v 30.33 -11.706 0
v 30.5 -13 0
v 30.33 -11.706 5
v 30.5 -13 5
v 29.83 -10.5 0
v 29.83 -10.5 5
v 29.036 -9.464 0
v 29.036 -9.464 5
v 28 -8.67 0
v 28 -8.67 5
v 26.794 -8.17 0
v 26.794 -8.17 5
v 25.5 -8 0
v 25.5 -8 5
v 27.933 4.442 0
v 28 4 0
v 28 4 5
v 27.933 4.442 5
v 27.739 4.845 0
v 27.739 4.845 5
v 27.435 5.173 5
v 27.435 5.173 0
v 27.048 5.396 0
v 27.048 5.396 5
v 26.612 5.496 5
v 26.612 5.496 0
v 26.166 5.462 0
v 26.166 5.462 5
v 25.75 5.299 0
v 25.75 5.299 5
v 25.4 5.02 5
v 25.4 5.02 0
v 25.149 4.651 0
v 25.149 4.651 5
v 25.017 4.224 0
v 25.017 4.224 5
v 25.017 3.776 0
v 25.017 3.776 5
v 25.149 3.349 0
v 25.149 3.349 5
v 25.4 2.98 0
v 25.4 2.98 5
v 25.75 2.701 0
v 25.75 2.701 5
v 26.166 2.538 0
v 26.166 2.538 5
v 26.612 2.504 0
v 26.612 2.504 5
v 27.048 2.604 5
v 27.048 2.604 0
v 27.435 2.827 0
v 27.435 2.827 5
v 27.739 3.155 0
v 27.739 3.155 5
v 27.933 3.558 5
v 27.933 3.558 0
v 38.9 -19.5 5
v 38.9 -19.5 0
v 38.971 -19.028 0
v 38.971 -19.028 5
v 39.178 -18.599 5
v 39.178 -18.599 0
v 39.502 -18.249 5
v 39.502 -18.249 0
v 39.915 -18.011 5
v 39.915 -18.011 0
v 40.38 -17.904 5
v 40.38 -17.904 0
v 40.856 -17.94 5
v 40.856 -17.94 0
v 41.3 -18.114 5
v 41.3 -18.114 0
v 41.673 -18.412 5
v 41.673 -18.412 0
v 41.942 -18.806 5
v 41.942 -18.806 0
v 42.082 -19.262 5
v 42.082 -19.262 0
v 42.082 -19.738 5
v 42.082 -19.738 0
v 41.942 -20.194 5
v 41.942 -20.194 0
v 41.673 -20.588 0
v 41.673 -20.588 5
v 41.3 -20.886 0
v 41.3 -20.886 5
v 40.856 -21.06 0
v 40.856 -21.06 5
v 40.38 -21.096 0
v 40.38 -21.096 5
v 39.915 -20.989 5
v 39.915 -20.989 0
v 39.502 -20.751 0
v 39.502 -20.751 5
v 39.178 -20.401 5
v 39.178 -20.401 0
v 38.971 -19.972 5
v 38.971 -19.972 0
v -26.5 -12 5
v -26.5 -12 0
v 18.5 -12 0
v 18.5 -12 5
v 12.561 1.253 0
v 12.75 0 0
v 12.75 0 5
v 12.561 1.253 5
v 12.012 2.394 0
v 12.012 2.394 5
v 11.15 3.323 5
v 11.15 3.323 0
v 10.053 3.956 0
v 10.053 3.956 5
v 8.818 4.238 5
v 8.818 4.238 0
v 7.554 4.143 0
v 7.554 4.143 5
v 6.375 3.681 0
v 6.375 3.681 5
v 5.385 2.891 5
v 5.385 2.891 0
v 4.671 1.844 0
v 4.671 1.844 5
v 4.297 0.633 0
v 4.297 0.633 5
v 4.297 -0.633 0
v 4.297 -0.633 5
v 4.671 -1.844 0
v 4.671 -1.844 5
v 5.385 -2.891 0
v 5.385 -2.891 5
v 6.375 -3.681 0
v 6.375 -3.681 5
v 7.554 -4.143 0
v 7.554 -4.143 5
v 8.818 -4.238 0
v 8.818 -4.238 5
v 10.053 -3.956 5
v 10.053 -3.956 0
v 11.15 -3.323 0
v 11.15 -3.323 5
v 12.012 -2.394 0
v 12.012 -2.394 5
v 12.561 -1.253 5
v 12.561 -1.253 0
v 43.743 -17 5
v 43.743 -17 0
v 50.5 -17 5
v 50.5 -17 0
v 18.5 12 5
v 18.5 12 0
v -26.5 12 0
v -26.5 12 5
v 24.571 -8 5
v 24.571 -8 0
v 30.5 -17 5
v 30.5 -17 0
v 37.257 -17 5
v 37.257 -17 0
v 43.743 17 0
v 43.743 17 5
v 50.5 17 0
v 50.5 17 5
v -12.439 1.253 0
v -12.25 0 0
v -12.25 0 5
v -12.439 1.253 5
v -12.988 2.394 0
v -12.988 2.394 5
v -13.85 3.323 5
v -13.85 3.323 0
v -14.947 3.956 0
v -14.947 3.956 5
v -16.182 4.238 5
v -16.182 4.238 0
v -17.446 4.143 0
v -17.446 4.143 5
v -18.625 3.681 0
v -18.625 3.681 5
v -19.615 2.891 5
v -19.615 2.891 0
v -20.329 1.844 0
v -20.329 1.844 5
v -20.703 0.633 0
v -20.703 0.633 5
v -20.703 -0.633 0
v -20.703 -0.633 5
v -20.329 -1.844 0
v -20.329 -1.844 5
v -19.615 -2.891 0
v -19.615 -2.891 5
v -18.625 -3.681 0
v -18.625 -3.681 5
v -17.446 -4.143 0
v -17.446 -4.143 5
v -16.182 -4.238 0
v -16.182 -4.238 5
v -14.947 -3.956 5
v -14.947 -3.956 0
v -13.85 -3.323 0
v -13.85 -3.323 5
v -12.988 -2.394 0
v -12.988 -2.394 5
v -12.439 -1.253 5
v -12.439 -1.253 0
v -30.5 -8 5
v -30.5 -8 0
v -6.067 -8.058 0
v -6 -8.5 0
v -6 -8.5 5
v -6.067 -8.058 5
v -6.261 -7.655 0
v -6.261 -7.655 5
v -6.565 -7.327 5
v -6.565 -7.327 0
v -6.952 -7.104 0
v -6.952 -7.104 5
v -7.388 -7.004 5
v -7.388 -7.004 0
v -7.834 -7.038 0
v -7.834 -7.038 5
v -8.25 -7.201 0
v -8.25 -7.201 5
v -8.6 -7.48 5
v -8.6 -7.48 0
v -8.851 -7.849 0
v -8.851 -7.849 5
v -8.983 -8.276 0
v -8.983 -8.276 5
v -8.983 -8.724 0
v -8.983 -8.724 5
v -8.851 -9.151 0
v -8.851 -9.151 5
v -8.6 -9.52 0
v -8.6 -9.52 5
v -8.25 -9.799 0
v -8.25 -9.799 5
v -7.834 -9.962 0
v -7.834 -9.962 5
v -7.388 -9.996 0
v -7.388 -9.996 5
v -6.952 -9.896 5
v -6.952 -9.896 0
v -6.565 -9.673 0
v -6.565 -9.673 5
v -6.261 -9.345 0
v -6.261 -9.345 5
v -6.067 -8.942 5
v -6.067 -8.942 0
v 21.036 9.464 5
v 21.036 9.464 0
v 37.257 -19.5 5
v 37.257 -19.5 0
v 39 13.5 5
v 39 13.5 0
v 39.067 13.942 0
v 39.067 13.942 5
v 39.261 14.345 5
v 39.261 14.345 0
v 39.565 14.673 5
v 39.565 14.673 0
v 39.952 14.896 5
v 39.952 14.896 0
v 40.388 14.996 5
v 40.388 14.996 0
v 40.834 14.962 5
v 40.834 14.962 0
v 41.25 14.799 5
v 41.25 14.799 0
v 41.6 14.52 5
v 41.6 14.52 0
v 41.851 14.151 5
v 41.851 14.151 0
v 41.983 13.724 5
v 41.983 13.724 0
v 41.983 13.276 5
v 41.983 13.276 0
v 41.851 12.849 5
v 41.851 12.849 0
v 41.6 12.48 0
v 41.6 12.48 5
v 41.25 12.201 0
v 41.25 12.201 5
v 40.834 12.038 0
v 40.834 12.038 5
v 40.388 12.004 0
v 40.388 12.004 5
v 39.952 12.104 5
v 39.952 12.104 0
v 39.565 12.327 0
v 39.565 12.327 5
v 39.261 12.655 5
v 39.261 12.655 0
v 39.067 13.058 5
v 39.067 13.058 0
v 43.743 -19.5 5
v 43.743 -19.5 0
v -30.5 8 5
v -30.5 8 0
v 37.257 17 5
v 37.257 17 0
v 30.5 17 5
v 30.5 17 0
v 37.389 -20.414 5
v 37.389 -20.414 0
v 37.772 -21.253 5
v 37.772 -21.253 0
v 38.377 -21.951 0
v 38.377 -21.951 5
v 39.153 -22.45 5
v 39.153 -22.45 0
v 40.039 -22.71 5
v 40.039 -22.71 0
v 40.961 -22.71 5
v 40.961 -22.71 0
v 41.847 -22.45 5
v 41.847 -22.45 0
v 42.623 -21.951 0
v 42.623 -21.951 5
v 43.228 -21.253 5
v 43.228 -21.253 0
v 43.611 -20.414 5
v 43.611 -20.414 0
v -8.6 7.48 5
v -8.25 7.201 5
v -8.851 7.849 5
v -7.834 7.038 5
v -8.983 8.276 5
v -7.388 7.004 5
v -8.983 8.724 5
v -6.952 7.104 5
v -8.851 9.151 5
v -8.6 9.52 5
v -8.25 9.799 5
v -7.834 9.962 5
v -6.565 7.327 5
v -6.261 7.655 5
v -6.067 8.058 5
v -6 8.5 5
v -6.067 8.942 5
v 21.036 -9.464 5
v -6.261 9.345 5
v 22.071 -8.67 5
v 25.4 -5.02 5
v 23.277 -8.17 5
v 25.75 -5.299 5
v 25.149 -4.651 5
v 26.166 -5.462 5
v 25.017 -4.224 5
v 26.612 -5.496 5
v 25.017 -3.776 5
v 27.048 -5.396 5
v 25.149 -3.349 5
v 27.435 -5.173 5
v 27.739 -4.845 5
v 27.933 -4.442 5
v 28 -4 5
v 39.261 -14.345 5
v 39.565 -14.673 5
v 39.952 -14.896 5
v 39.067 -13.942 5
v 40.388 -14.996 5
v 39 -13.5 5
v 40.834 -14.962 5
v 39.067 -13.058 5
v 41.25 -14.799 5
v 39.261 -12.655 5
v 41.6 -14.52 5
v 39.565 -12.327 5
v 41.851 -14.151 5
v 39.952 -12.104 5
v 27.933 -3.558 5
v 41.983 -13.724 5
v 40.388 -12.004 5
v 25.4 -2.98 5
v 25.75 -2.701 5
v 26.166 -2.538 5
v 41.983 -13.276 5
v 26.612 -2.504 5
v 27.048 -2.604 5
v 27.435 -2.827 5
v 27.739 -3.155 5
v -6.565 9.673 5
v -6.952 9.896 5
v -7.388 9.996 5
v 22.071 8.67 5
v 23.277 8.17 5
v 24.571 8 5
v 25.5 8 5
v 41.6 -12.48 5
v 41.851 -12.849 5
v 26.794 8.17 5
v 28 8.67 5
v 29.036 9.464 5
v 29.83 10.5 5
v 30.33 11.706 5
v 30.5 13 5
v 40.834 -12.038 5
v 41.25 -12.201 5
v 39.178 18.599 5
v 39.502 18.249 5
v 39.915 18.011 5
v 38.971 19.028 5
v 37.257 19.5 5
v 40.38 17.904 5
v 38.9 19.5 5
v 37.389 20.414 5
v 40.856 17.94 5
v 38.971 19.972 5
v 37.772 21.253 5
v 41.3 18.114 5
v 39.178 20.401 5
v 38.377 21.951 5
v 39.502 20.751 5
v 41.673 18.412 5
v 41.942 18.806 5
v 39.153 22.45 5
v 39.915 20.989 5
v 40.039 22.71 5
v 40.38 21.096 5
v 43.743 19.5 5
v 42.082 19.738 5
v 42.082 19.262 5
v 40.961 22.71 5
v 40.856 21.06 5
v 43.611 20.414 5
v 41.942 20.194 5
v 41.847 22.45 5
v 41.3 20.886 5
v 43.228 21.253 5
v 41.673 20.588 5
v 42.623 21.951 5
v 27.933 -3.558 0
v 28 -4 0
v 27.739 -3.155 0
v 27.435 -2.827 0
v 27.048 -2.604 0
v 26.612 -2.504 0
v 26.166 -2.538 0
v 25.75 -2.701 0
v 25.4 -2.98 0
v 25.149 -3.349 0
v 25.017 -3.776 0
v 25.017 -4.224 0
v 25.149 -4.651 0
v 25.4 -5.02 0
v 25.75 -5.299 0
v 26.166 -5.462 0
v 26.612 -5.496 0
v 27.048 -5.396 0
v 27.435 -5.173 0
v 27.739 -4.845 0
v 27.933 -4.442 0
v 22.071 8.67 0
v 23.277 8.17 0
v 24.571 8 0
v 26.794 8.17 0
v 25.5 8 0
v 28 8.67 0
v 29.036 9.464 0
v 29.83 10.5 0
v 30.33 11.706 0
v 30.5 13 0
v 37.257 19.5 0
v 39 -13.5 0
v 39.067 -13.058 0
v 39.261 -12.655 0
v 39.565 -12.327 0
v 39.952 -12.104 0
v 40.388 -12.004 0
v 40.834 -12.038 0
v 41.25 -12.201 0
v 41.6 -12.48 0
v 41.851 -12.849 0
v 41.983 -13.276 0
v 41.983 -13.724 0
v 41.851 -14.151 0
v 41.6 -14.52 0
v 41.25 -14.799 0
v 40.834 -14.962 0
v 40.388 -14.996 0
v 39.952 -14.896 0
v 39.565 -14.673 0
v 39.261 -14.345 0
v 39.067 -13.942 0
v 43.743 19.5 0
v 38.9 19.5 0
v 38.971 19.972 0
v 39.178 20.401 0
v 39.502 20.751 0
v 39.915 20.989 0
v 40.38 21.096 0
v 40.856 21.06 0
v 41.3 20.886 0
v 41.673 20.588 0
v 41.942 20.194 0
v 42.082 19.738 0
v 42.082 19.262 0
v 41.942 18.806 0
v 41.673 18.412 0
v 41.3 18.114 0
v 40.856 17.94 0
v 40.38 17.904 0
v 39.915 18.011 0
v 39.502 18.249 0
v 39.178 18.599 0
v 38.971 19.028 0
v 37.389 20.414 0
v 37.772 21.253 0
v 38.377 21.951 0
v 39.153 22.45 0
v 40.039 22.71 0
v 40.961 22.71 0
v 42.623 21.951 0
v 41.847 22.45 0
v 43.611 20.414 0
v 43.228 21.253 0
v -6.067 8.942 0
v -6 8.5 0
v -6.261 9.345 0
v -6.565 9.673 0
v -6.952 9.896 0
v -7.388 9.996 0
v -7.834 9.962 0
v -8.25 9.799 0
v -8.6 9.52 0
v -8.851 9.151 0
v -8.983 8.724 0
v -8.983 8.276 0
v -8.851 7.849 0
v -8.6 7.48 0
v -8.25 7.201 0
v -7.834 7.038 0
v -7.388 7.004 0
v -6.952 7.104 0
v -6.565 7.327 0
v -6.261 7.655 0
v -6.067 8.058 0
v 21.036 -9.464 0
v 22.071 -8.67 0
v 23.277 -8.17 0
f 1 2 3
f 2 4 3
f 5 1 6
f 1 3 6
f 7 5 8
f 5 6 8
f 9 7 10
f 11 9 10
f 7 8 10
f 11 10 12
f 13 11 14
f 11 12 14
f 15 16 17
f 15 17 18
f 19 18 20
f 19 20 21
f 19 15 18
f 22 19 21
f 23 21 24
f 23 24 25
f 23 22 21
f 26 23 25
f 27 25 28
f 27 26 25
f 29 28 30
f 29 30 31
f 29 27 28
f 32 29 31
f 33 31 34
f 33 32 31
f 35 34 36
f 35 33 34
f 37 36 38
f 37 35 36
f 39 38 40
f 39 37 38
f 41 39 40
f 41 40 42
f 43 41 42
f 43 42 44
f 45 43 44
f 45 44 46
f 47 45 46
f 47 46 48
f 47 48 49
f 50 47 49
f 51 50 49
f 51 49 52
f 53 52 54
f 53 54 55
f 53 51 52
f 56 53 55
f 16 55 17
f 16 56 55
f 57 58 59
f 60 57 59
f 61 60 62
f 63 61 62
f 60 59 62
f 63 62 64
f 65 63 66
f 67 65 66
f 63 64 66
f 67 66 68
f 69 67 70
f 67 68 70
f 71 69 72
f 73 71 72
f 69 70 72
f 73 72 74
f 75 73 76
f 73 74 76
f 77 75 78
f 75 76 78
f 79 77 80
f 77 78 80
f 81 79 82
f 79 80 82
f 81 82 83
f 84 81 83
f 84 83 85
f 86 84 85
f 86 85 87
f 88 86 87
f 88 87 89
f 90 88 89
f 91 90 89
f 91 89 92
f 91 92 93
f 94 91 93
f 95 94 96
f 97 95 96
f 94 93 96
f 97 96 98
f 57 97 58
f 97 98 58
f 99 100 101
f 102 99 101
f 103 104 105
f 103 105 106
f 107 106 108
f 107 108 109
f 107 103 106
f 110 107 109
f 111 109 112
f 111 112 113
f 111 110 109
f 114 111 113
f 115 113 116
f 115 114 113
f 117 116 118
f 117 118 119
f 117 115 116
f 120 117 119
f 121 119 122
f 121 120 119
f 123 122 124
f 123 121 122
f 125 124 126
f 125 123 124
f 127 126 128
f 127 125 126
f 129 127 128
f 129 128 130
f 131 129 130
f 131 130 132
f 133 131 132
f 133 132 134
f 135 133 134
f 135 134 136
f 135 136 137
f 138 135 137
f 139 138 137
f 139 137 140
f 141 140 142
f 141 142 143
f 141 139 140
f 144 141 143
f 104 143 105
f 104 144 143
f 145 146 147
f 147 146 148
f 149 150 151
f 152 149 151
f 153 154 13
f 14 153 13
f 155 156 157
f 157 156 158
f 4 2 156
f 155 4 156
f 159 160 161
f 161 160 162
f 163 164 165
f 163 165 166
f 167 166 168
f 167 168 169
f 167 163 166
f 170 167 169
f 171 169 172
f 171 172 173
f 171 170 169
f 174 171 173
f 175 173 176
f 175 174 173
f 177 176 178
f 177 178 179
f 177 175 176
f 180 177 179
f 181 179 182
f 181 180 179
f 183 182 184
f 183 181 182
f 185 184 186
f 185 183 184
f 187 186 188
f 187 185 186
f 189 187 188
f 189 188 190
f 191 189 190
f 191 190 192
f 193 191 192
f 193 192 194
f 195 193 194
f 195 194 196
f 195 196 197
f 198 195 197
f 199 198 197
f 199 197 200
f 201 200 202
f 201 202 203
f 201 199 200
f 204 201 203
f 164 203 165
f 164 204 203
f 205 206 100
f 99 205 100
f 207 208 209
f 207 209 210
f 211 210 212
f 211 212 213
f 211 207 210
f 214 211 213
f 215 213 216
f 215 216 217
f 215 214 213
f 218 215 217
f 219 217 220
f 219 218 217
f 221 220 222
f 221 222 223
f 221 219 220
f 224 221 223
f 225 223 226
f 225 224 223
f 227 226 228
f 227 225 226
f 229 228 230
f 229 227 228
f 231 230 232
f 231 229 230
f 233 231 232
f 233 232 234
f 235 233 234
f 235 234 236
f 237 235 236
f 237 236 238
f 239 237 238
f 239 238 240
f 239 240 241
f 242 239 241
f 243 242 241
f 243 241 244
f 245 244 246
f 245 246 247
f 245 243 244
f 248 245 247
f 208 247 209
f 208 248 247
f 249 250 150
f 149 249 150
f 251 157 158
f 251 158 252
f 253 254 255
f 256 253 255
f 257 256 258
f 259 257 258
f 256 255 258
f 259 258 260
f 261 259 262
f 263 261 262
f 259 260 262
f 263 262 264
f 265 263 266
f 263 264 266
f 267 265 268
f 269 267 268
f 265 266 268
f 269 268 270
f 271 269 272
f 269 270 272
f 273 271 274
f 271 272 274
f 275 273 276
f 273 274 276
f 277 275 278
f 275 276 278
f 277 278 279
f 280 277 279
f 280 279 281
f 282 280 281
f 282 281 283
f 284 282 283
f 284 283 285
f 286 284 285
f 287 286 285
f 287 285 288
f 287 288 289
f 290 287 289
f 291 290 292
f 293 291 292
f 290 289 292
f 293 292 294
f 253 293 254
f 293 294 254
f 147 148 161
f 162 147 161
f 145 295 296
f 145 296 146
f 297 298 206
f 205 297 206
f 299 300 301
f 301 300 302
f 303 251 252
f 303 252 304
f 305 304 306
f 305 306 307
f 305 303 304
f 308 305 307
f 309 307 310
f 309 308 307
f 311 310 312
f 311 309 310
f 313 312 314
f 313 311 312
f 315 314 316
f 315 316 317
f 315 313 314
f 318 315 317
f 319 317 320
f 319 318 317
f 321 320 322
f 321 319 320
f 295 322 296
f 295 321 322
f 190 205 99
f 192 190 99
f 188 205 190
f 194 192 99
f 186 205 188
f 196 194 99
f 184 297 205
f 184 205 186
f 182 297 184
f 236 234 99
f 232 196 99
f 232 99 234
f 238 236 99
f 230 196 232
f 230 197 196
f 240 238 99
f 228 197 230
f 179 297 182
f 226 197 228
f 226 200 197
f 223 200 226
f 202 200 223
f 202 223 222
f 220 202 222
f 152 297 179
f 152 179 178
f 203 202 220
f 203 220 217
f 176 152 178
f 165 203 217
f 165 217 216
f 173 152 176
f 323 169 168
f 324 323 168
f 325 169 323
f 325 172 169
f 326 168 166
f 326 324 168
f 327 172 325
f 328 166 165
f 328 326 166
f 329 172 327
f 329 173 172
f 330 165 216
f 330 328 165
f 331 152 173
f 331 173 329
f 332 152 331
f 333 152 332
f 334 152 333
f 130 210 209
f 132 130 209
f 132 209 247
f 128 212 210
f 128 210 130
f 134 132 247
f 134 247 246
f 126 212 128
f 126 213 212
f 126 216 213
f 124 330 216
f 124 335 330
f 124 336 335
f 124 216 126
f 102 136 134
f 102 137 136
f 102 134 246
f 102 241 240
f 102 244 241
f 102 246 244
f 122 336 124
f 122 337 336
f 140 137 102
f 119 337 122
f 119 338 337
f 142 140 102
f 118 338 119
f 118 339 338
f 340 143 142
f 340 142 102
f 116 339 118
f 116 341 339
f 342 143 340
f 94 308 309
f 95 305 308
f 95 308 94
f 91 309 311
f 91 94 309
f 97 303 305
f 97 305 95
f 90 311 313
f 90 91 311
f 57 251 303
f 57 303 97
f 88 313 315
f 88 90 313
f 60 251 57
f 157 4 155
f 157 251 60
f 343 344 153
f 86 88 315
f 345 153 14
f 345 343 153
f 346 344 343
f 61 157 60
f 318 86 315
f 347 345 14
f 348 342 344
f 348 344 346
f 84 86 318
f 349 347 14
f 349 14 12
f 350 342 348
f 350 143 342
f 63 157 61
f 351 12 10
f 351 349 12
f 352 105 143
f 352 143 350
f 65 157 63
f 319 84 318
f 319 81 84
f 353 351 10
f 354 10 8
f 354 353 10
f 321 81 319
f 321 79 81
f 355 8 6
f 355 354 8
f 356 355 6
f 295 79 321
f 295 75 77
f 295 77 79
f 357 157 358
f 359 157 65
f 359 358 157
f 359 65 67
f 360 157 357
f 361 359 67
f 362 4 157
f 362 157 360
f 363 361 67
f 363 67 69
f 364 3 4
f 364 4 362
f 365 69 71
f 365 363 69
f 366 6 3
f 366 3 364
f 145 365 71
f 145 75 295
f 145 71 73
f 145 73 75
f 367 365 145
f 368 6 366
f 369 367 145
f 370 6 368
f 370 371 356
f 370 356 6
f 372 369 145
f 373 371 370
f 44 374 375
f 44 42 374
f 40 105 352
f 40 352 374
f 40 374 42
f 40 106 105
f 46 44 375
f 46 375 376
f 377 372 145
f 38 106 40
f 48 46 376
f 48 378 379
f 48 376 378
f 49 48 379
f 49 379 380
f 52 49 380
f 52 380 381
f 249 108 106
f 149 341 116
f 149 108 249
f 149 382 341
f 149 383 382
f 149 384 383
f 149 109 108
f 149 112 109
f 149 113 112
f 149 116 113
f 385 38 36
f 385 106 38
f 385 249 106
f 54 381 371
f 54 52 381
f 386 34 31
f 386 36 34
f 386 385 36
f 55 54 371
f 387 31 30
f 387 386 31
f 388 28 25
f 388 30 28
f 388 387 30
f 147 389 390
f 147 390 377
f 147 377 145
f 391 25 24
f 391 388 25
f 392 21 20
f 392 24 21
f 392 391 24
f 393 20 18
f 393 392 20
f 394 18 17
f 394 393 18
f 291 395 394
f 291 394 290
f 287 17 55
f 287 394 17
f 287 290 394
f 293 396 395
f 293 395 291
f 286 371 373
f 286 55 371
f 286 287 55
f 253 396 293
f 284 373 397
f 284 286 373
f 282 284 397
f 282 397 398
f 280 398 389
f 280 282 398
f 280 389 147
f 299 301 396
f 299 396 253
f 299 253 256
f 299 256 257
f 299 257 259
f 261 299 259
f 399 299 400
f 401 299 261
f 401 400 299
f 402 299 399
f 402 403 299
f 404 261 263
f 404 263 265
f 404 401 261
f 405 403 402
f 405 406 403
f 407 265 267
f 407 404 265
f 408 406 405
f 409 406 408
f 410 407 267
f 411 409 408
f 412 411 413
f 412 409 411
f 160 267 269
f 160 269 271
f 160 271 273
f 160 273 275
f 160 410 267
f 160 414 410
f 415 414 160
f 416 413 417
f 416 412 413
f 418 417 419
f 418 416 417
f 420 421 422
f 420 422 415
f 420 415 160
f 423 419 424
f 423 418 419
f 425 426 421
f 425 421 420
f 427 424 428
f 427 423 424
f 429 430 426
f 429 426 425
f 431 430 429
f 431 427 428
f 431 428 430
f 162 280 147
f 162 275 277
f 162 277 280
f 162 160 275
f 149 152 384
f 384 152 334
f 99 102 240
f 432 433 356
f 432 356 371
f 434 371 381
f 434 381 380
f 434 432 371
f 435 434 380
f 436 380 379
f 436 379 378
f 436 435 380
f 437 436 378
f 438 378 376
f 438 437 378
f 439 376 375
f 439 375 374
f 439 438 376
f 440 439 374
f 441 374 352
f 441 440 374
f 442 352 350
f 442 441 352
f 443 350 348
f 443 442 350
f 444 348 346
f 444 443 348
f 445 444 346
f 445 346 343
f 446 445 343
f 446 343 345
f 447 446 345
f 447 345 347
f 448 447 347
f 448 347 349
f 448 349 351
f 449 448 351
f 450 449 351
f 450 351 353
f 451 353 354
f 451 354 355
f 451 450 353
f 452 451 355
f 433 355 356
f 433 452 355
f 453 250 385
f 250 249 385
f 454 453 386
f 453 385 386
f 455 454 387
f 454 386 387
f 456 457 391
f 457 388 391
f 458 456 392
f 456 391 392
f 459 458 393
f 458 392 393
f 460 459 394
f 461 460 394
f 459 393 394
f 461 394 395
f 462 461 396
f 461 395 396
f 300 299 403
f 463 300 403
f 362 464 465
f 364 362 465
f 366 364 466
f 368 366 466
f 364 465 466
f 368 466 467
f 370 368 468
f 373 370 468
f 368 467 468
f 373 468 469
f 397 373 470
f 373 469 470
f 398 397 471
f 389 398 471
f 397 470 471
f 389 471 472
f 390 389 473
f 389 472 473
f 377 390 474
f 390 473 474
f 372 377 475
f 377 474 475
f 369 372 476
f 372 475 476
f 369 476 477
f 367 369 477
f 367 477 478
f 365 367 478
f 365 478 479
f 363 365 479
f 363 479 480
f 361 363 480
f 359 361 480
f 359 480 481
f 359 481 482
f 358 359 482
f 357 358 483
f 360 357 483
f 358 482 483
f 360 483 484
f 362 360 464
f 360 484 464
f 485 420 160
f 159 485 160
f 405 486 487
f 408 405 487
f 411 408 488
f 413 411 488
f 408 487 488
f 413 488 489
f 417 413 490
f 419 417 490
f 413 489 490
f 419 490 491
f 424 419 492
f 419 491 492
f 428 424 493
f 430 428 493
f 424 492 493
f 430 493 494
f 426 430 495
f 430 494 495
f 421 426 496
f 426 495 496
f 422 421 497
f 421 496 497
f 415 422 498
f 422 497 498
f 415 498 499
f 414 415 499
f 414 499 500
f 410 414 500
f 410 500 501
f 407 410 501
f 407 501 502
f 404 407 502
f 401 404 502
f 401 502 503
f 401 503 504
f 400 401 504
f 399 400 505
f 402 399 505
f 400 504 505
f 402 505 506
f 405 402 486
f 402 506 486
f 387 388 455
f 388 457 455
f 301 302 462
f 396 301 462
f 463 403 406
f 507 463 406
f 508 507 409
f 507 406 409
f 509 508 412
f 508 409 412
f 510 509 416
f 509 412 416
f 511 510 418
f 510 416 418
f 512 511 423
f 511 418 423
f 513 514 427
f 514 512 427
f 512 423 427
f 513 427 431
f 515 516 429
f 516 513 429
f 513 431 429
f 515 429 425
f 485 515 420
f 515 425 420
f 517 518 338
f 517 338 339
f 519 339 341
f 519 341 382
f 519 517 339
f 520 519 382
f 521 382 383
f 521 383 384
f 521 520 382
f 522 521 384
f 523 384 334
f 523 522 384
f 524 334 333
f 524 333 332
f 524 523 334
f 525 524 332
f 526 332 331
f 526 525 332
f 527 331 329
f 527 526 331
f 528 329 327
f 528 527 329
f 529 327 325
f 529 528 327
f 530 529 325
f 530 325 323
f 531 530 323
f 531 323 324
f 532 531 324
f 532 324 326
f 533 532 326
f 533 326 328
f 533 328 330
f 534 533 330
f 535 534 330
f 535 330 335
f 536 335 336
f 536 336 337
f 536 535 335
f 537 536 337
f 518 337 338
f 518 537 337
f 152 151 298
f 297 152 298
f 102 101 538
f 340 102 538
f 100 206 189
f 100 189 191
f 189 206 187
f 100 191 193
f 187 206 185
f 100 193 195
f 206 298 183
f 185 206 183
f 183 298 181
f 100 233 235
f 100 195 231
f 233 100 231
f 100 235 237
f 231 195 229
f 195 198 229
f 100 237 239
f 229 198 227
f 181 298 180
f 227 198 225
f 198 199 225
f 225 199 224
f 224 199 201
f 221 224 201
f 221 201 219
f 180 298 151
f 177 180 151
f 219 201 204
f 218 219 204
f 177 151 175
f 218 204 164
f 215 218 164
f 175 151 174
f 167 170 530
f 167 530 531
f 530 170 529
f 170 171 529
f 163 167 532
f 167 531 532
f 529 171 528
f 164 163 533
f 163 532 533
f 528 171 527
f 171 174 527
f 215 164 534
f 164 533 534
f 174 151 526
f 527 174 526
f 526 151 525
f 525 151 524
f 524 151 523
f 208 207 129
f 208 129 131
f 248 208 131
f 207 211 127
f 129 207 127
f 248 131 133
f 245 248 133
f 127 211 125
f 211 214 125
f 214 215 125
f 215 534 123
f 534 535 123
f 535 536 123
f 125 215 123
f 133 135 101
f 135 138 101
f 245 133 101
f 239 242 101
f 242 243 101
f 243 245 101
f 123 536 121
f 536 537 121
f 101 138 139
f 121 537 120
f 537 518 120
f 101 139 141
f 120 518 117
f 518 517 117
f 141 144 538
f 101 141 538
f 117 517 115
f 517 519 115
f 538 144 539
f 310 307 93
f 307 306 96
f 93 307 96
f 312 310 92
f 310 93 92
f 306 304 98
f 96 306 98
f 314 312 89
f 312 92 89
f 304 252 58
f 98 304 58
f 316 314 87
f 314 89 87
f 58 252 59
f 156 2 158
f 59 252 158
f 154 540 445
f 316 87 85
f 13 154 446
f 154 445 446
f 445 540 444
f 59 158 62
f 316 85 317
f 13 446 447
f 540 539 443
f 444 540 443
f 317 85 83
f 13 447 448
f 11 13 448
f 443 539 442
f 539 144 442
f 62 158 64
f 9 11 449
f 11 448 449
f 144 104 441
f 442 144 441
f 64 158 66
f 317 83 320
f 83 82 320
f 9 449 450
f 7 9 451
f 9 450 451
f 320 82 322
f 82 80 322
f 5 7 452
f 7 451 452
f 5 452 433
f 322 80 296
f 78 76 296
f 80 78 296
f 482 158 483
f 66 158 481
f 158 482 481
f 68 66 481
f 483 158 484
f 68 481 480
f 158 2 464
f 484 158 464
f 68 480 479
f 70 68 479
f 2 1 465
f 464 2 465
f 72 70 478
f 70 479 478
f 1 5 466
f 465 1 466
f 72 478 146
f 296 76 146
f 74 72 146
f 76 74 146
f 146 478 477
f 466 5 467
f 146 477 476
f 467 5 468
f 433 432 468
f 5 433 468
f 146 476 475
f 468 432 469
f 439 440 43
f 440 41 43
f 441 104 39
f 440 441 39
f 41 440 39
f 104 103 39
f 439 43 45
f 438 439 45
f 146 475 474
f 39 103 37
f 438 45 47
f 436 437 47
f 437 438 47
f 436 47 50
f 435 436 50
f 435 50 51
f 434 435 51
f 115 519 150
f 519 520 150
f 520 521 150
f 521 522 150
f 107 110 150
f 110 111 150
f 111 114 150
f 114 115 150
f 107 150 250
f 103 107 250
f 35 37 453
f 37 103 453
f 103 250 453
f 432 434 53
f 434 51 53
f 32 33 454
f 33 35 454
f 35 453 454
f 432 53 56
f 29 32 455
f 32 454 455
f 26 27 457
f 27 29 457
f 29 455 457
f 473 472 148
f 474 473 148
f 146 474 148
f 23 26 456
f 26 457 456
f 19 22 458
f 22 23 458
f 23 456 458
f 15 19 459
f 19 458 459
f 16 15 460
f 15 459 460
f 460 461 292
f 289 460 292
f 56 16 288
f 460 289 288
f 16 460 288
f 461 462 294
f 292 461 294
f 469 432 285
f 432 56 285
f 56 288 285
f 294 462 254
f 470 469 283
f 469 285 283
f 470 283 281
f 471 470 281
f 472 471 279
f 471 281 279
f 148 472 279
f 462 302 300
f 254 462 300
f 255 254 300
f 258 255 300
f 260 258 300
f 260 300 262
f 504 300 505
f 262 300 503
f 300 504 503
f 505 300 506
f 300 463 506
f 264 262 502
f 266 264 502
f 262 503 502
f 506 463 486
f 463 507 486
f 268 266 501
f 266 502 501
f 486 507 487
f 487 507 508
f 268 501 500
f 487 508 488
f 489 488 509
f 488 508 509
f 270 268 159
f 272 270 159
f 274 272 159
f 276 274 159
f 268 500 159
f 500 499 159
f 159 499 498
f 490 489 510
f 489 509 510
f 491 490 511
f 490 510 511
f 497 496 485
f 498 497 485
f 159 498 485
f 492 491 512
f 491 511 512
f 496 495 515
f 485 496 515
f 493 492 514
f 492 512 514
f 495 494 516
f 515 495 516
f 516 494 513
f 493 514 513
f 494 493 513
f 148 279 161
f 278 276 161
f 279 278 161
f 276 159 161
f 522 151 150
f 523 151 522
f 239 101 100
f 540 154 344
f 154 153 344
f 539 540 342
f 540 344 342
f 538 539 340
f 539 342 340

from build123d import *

# Parameters (mm, degrees)
ESQUISSE1_R             = 4.25
ESQUISSE1_R_2           = 1.5
BOSS_EXTRU_1_DEPTH      = 5
ESQUISSE2_R             = 1.5
ESQUISSE2_R_2           = 1.6
BOSS_EXTRU_2_DEPTH      = 5
CONG_1_R                = 1
ENL_V_MAT_EXTRU_1_DEPTH = 10.5
CONG_2_R                = 5


with BuildPart() as part:
    # Esquisse1 → Boss.-Extru.1 (new body)
    with BuildSketch(Plane.XY):
        with BuildLine():
            Line((30.5, 0), (30.5, 3))
            ThreePointArc((30.5, 3), (29.035533906, 6.535533906), (25.5, 8))
            Line((25.5, 8), (22.5, 8))
            Line((22.5, 8), (18.5, 12))
            Line((18.5, 12), (-26.5, 12))
            Line((-26.5, 12), (-30.5, 8))
            Line((-30.5, 8), (-30.5, 0))
            Line((-30.5, 0), (-30.5, -8))
            Line((-30.5, -8), (-26.5, -12))
            Line((-26.5, -12), (18.5, -12))
            Line((18.5, -12), (22.5, -8))
            Line((22.5, -8), (25.5, -8))
            ThreePointArc((25.5, -8), (29.035533906, -6.535533906), (30.5, -3))
            Line((30.5, -3), (30.5, 0))
        make_face()
        with Locations((-16.5, 0)):
            Circle(ESQUISSE1_R, mode=Mode.SUBTRACT)
        with Locations((-7.5, -8.5)):
            Circle(ESQUISSE1_R_2, mode=Mode.SUBTRACT)
        with Locations((8.5, 0)):
            Circle(ESQUISSE1_R, mode=Mode.SUBTRACT)
        with Locations((-7.5, 8.5)):
            Circle(ESQUISSE1_R_2, mode=Mode.SUBTRACT)
        with Locations((26.5, 4)):
            Circle(ESQUISSE1_R_2, mode=Mode.SUBTRACT)
        with Locations((26.5, -4)):
            Circle(ESQUISSE1_R_2, mode=Mode.SUBTRACT)
    extrude(amount=BOSS_EXTRU_1_DEPTH)

    # Esquisse2 → Boss.-Extru.2 (add)
    with BuildSketch(Plane(origin=(0, 0, 0), x_dir=(-1, 0, 0), z_dir=(0, 0, -1))):
        with BuildLine():
            Line((-30.5, 17), (-30.5, 8))
            Line((-30.5, 8), (-25.5, 8))
            ThreePointArc((-25.5, 8), (-29.035533906, 6.535533906), (-30.5, 3))
            Line((-30.5, 3), (-30.5, -3))
            ThreePointArc((-30.5, -3), (-29.035533906, -6.535533906), (-25.5, -8))
            Line((-25.5, -8), (-30.5, -8))
            Line((-30.5, -8), (-30.5, -16))
            Line((-30.5, -16), (-30.5, -17))
            Line((-30.5, -17), (-36.257359313, -17))
            Line((-36.257359313, -17), (-36.257359313, -21))
            ThreePointArc((-36.257359313, -21), (-40.5, -24), (-44.742640687, -21))
            Line((-44.742640687, -21), (-44.742640687, -17))
            Line((-44.742640687, -17), (-50.5, -17))
            Line((-50.5, -17), (-50.5, 17))
            Line((-50.5, 17), (-44.742640687, 17))
            Line((-44.742640687, 17), (-44.742640687, 21))
            ThreePointArc((-44.742640687, 21), (-40.5, 24), (-36.257359313, 21))
            Line((-36.257359313, 21), (-36.257359313, 17))
            Line((-36.257359313, 17), (-30.5, 17))
        make_face()
        with Locations((-40.5, 13.5)):
            Circle(ESQUISSE2_R, mode=Mode.SUBTRACT)
        with Locations((-40.5, -13.5)):
            Circle(ESQUISSE2_R, mode=Mode.SUBTRACT)
        with Locations((-40.5, 19.5)):
            Circle(ESQUISSE2_R_2, mode=Mode.SUBTRACT)
        with Locations((-40.5, -19.5)):
            Circle(ESQUISSE2_R_2, mode=Mode.SUBTRACT)
    extrude(amount=-BOSS_EXTRU_2_DEPTH)

    # Congé1
    cong_1_edges = [part.edges().sort_by_distance(p)[0] for p in [
        (44.742640687, -21, 2.5),
    ]]
    fillet(cong_1_edges, radius=CONG_1_R)

    # Esquisse5 → Enlèv. mat.-Extru.1 (cut)
    with BuildSketch(Plane.XY.offset(5)):
        with BuildLine():
            Line((37.257359313, 17), (37.257359313, 19.5))
            ThreePointArc((37.257359313, 19.5), (40.5, 22.742640687), (43.742640687, 19.5))
            Line((43.742640687, 19.5), (43.742640687, 17))
            Line((43.742640687, 17), (46.702112937, 17))
            Line((46.702112937, 17), (46.702112937, 27.914494418))
            Line((46.702112937, 27.914494418), (36.257359313, 27.914494418))
            Line((36.257359313, 27.914494418), (36.257359313, 17))
            Line((36.257359313, 17), (37.257359313, 17))
        make_face()
        with BuildLine():
            Line((43.742640687, -19.5), (43.742640687, -17))
            Line((43.742640687, -17), (44.742640687, -17))
            Line((44.742640687, -17), (44.742640687, -31.949987741))
            Line((44.742640687, -31.949987741), (43.742640687, -31.949987741))
            Line((43.742640687, -31.949987741), (37.257359313, -31.949987741))
            Line((37.257359313, -31.949987741), (34.849139441, -17))
            Line((34.849139441, -17), (37.257359313, -17))
            Line((37.257359313, -17), (37.257359313, -19.5))
            ThreePointArc((37.257359313, -19.5), (40.5, -22.742640687), (43.742640687, -19.5))
        make_face()
    extrude(amount=-ENL_V_MAT_EXTRU_1_DEPTH, mode=Mode.SUBTRACT)

    # Congé2
    cong_2_edges = [part.edges().sort_by_distance(p)[0] for p in [
        (22.5, -8, 2.5),
        (22.5, 8, 2.5),
        (30.5, 8, 2.5),
        (30.5, -8, 2.5),
    ]]
    fillet(cong_2_edges, radius=CONG_2_R)


solid = part.part
